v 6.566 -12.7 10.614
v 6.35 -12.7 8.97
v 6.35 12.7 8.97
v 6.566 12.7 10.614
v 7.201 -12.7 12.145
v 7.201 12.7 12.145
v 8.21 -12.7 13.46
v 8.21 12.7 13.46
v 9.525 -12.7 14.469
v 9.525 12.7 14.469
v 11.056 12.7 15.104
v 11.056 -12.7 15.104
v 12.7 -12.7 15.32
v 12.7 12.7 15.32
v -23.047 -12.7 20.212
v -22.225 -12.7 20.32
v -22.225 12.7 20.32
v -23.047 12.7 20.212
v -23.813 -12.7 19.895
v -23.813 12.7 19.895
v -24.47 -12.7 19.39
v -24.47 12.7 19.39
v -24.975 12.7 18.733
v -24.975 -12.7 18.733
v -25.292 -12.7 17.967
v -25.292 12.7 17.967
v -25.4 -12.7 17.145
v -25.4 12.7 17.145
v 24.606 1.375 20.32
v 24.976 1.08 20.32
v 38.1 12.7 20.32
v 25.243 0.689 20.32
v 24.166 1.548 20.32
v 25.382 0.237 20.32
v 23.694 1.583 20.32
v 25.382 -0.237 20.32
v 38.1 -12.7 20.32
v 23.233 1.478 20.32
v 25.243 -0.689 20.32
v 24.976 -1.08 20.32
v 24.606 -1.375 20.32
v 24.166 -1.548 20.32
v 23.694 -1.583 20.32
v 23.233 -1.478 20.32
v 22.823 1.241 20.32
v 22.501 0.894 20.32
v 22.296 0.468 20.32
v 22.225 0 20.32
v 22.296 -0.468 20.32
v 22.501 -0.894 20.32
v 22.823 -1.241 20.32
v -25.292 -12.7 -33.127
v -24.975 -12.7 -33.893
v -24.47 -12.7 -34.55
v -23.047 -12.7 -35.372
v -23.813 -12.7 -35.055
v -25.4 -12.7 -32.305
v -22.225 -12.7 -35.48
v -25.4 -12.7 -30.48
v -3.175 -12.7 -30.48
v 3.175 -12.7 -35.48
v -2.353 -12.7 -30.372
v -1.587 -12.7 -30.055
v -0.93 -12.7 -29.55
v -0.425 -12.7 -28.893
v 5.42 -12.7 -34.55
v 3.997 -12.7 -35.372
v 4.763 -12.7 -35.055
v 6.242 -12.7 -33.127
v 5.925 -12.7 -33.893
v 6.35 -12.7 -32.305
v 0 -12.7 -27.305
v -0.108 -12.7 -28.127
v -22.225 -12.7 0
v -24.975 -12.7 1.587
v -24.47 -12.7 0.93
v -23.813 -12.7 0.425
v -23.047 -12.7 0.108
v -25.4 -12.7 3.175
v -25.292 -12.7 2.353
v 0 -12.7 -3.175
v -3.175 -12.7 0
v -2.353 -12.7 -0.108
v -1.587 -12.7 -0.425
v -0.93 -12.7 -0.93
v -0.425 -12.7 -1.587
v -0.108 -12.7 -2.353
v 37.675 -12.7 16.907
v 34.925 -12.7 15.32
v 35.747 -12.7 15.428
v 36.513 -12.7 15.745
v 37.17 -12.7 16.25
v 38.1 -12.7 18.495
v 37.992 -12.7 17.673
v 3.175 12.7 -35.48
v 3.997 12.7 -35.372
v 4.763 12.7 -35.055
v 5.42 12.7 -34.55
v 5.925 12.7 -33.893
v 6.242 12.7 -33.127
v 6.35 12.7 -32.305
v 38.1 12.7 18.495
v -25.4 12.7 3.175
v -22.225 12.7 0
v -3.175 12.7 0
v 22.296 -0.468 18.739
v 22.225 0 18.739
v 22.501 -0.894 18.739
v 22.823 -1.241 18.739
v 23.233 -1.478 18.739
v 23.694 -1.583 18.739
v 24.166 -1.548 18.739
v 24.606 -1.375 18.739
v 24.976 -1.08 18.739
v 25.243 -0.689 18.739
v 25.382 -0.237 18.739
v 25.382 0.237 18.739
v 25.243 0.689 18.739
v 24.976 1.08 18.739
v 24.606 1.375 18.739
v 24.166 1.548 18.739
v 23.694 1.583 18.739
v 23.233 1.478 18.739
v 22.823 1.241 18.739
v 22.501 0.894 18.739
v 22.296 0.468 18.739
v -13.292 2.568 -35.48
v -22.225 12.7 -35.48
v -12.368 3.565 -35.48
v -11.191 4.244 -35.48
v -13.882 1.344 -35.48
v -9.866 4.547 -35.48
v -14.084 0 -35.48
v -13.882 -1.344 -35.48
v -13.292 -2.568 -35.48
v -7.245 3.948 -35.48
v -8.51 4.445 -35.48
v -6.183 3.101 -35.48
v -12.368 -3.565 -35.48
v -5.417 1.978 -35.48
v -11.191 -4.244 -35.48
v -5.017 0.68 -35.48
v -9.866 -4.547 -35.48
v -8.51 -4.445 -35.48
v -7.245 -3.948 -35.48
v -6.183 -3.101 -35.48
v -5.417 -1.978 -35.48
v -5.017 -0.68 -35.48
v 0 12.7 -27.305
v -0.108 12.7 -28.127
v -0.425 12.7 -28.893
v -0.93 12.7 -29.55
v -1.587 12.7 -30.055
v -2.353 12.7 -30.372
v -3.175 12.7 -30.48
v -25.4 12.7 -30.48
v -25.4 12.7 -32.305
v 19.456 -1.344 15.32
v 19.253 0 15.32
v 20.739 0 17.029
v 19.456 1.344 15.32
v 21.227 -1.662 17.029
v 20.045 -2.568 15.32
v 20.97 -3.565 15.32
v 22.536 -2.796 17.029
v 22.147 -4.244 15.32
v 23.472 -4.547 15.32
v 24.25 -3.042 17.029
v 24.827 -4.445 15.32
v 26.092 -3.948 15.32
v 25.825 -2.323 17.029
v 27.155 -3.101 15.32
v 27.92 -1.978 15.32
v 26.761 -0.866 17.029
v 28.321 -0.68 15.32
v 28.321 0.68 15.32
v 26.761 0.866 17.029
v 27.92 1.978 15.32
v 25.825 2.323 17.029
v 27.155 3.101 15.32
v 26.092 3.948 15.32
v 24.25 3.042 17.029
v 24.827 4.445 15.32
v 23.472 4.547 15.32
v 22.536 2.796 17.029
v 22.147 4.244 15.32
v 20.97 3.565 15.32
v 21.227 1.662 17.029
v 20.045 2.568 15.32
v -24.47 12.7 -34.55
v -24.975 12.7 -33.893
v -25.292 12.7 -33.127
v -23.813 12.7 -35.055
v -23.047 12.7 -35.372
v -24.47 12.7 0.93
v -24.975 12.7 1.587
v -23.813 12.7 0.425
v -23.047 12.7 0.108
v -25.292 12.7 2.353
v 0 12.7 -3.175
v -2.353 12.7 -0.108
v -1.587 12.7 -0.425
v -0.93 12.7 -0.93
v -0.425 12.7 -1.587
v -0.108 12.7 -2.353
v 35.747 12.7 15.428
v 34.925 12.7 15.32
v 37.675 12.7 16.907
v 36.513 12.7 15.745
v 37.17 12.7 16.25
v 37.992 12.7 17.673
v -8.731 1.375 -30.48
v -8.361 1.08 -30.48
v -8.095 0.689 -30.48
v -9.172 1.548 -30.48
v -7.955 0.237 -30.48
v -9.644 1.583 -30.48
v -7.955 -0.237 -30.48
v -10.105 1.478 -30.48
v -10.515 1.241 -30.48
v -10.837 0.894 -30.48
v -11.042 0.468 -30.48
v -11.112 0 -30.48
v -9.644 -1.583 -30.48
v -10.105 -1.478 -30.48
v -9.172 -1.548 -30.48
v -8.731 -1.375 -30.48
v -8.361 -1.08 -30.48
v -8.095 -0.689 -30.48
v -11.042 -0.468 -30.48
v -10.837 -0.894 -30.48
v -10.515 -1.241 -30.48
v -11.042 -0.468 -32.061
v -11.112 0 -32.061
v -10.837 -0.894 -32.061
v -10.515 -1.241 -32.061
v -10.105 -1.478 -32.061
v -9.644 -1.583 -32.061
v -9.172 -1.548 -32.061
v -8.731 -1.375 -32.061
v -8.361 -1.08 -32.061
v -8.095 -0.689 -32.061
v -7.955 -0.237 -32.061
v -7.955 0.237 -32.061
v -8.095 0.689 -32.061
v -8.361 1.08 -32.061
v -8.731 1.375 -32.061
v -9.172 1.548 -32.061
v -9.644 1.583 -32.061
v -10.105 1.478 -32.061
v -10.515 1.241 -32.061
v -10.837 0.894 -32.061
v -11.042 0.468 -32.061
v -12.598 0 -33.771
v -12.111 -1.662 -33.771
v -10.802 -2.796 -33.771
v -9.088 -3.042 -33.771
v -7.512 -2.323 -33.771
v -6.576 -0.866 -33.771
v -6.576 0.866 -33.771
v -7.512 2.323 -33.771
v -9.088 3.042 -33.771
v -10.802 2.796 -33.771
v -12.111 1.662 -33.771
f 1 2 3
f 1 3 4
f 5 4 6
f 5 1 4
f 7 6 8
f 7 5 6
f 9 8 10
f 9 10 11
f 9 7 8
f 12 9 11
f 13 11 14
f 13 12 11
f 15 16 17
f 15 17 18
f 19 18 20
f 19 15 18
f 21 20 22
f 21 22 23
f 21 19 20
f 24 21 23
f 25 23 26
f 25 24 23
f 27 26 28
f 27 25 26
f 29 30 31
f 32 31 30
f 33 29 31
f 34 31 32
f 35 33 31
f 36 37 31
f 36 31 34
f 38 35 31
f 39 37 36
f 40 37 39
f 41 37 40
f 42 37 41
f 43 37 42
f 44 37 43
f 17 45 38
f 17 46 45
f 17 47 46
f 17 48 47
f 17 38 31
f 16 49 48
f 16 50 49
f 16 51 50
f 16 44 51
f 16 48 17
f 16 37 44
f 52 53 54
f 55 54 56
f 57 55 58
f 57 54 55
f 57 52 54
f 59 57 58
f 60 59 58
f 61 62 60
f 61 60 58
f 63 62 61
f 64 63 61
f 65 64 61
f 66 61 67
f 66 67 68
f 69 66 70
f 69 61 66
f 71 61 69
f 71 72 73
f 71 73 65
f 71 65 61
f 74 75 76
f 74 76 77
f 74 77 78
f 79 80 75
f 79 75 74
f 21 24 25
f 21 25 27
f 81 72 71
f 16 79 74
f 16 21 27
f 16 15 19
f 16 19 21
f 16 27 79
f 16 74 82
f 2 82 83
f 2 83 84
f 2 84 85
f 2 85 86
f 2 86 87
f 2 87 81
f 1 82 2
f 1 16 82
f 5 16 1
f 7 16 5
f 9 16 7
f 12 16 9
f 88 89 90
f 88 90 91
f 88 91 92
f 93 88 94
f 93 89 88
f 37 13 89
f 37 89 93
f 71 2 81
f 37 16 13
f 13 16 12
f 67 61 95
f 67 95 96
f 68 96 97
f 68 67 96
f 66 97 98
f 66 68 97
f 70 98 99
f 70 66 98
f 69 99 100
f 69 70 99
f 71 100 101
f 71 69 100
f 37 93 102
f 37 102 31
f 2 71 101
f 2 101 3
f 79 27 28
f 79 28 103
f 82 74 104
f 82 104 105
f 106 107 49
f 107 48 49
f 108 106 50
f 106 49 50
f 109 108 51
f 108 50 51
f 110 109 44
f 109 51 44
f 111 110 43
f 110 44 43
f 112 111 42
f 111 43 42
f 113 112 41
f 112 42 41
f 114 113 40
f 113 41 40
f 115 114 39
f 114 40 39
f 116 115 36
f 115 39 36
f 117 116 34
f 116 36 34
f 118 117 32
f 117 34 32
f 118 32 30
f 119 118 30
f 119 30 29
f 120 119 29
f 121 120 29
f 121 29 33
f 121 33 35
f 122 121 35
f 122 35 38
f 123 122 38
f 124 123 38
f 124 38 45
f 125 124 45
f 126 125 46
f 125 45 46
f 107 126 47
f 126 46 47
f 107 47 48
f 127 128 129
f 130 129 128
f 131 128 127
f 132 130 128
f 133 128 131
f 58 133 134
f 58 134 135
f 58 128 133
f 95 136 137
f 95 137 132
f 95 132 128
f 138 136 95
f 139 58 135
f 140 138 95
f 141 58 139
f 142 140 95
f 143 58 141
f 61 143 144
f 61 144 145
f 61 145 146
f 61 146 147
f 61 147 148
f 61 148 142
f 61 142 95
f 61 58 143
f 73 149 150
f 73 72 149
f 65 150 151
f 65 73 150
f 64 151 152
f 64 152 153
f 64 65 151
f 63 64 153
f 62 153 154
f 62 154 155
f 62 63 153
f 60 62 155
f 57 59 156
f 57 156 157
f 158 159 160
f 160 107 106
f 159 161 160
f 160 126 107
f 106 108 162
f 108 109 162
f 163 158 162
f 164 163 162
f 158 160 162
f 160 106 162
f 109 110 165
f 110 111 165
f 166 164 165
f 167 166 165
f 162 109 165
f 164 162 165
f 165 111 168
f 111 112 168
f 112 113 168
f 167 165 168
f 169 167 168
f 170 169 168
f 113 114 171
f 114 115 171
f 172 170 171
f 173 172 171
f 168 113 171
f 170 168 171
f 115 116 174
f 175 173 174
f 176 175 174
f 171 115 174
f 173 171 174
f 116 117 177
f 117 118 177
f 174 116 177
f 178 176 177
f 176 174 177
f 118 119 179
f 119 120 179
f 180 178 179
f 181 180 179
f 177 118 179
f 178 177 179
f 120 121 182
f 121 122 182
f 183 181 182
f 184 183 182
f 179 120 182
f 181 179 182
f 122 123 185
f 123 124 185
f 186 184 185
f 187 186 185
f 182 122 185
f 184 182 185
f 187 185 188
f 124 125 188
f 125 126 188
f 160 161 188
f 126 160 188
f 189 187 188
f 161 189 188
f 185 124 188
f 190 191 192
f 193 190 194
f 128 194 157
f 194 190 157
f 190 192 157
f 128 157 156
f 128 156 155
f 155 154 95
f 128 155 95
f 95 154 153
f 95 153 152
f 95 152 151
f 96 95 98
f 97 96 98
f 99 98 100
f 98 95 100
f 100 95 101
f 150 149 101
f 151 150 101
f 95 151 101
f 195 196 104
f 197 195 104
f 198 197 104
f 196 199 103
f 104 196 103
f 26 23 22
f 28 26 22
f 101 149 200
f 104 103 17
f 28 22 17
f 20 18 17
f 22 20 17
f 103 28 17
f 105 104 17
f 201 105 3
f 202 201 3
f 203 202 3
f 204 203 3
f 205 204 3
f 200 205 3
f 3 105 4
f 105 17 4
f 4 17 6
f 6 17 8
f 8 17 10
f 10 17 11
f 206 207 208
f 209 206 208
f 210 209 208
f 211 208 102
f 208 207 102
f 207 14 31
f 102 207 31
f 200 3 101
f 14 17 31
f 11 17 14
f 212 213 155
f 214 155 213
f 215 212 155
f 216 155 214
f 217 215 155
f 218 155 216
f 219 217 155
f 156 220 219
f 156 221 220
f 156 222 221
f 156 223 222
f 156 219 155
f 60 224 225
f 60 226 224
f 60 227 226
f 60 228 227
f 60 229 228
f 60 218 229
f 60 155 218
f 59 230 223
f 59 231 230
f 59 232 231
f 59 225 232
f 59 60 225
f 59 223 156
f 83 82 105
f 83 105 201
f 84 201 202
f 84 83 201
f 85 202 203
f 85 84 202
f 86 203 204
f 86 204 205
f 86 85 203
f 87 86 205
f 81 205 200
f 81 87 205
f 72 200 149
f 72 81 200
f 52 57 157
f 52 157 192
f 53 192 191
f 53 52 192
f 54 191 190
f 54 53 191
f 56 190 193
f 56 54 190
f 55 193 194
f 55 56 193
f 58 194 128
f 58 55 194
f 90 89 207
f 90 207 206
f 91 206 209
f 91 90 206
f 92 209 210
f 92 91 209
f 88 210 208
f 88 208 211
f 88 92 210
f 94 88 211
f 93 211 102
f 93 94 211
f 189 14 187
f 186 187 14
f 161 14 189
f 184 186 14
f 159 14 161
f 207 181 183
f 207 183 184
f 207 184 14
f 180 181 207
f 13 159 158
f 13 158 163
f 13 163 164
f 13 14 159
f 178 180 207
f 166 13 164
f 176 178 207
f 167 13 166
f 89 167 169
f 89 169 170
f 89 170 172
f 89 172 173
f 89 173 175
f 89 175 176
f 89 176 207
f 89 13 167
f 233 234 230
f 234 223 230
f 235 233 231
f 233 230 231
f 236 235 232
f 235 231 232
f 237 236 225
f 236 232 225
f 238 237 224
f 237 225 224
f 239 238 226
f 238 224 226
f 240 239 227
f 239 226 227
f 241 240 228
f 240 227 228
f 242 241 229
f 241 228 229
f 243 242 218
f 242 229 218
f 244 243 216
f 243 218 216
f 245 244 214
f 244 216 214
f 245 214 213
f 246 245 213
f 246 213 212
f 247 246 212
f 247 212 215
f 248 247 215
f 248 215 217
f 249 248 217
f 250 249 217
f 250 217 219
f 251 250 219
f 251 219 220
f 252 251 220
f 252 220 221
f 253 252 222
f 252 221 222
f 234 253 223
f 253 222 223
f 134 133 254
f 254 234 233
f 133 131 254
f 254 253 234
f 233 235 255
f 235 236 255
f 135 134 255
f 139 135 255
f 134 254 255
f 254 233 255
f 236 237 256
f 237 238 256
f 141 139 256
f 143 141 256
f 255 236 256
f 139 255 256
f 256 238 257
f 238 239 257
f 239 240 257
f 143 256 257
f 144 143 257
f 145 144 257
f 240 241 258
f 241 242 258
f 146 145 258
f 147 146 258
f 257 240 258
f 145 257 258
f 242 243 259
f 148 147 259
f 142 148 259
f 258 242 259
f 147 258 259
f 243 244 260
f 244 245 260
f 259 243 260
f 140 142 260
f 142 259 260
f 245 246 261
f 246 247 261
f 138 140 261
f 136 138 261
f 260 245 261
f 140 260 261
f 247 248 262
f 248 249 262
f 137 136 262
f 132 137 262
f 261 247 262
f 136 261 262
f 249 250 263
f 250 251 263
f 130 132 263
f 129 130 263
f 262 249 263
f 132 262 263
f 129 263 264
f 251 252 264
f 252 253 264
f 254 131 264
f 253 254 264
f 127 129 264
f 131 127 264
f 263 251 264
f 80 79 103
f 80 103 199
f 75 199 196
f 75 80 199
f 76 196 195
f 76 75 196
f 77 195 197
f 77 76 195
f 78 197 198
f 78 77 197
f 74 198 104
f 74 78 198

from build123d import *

# Parameters (mm, degrees)
F1_DEPTH             = 12.7
F4_D                 = 3.175
F4_DEPTH             = 25.4
F4_CSINK_D           = 9.1186
F4_CSINK_ANGLE       = 82
F4_TIP               = 0.9538662327
F4_ON_F2_D           = 3.175
F4_ON_F2_DEPTH       = 25.4
F4_ON_F2_CSINK_D     = 9.1186
F4_ON_F2_CSINK_ANGLE = 82
F4_ON_F2_TIP         = 0.9538662327


with BuildPart() as f1:
    # F0 (on Front) → F1 (new body, symmetric)
    with BuildSketch(Plane.XZ):
        with BuildLine():
            Line((-3.175, -30.48), (-25.4, -30.48))
            Line((-25.4, -30.48), (-25.4, -32.305))
            ThreePointArc((-25.4, -32.305), (-24.4700640303, -34.5500640303), (-22.225, -35.48))
            Line((-22.225, -35.48), (3.175, -35.48))
            ThreePointArc((3.175, -35.48), (5.4200640303, -34.5500640303), (6.35, -32.305))
            Line((6.35, -32.305), (6.35, 8.97))
            ThreePointArc((6.35, 8.97), (8.2098719395, 13.4601280605), (12.7, 15.32))
            Line((12.7, 15.32), (34.925, 15.32))
            ThreePointArc((34.925, 15.32), (37.1700640303, 16.2499359697), (38.1, 18.495))
            Line((38.1, 18.495), (38.1, 20.32))
            Line((38.1, 20.32), (-22.225, 20.32))
            ThreePointArc((-22.225, 20.32), (-24.4700640303, 19.3900640303), (-25.4, 17.145))
            Line((-25.4, 17.145), (-25.4, 3.175))
            ThreePointArc((-25.4, 3.175), (-24.4700640303, 0.9299359697), (-22.225, 0))
            Line((-22.225, 0), (-3.175, 0))
            ThreePointArc((-3.175, 0), (-0.9299359697, -0.9299359697), (0, -3.175))
            Line((0, -3.175), (0, -27.305))
            ThreePointArc((0, -27.305), (-0.9299359697, -29.5500640303), (-3.175, -30.48))
        make_face()
    extrude(amount=F1_DEPTH, both=True)

    # F4
    with Locations(Plane(origin=(0, 0, 15.32), x_dir=(1, 0, 0), z_dir=(0, 0, -1))):
        with Locations((23.8125, 0)):
            CounterSinkHole(F4_D / 2, F4_CSINK_D / 2, depth=F4_DEPTH, counter_sink_angle=F4_CSINK_ANGLE)
            with Locations((0, 0, -(F4_DEPTH + F4_TIP / 2))):  # 118° drill point
                Cone(0, F4_D / 2, F4_TIP, mode=Mode.SUBTRACT)

    # F4 on F2
    with Locations(Plane(origin=(0, 0, -35.48), x_dir=(1, 0, 0), z_dir=(0, 0, -1))):
        with Locations((-9.525, 0)):
            CounterSinkHole(F4_ON_F2_D / 2, F4_ON_F2_CSINK_D / 2, depth=F4_ON_F2_DEPTH, counter_sink_angle=F4_ON_F2_CSINK_ANGLE)
            with Locations((0, 0, -(F4_ON_F2_DEPTH + F4_ON_F2_TIP / 2))):  # 118° drill point
                Cone(0, F4_ON_F2_D / 2, F4_ON_F2_TIP, mode=Mode.SUBTRACT)


solid = f1.part
